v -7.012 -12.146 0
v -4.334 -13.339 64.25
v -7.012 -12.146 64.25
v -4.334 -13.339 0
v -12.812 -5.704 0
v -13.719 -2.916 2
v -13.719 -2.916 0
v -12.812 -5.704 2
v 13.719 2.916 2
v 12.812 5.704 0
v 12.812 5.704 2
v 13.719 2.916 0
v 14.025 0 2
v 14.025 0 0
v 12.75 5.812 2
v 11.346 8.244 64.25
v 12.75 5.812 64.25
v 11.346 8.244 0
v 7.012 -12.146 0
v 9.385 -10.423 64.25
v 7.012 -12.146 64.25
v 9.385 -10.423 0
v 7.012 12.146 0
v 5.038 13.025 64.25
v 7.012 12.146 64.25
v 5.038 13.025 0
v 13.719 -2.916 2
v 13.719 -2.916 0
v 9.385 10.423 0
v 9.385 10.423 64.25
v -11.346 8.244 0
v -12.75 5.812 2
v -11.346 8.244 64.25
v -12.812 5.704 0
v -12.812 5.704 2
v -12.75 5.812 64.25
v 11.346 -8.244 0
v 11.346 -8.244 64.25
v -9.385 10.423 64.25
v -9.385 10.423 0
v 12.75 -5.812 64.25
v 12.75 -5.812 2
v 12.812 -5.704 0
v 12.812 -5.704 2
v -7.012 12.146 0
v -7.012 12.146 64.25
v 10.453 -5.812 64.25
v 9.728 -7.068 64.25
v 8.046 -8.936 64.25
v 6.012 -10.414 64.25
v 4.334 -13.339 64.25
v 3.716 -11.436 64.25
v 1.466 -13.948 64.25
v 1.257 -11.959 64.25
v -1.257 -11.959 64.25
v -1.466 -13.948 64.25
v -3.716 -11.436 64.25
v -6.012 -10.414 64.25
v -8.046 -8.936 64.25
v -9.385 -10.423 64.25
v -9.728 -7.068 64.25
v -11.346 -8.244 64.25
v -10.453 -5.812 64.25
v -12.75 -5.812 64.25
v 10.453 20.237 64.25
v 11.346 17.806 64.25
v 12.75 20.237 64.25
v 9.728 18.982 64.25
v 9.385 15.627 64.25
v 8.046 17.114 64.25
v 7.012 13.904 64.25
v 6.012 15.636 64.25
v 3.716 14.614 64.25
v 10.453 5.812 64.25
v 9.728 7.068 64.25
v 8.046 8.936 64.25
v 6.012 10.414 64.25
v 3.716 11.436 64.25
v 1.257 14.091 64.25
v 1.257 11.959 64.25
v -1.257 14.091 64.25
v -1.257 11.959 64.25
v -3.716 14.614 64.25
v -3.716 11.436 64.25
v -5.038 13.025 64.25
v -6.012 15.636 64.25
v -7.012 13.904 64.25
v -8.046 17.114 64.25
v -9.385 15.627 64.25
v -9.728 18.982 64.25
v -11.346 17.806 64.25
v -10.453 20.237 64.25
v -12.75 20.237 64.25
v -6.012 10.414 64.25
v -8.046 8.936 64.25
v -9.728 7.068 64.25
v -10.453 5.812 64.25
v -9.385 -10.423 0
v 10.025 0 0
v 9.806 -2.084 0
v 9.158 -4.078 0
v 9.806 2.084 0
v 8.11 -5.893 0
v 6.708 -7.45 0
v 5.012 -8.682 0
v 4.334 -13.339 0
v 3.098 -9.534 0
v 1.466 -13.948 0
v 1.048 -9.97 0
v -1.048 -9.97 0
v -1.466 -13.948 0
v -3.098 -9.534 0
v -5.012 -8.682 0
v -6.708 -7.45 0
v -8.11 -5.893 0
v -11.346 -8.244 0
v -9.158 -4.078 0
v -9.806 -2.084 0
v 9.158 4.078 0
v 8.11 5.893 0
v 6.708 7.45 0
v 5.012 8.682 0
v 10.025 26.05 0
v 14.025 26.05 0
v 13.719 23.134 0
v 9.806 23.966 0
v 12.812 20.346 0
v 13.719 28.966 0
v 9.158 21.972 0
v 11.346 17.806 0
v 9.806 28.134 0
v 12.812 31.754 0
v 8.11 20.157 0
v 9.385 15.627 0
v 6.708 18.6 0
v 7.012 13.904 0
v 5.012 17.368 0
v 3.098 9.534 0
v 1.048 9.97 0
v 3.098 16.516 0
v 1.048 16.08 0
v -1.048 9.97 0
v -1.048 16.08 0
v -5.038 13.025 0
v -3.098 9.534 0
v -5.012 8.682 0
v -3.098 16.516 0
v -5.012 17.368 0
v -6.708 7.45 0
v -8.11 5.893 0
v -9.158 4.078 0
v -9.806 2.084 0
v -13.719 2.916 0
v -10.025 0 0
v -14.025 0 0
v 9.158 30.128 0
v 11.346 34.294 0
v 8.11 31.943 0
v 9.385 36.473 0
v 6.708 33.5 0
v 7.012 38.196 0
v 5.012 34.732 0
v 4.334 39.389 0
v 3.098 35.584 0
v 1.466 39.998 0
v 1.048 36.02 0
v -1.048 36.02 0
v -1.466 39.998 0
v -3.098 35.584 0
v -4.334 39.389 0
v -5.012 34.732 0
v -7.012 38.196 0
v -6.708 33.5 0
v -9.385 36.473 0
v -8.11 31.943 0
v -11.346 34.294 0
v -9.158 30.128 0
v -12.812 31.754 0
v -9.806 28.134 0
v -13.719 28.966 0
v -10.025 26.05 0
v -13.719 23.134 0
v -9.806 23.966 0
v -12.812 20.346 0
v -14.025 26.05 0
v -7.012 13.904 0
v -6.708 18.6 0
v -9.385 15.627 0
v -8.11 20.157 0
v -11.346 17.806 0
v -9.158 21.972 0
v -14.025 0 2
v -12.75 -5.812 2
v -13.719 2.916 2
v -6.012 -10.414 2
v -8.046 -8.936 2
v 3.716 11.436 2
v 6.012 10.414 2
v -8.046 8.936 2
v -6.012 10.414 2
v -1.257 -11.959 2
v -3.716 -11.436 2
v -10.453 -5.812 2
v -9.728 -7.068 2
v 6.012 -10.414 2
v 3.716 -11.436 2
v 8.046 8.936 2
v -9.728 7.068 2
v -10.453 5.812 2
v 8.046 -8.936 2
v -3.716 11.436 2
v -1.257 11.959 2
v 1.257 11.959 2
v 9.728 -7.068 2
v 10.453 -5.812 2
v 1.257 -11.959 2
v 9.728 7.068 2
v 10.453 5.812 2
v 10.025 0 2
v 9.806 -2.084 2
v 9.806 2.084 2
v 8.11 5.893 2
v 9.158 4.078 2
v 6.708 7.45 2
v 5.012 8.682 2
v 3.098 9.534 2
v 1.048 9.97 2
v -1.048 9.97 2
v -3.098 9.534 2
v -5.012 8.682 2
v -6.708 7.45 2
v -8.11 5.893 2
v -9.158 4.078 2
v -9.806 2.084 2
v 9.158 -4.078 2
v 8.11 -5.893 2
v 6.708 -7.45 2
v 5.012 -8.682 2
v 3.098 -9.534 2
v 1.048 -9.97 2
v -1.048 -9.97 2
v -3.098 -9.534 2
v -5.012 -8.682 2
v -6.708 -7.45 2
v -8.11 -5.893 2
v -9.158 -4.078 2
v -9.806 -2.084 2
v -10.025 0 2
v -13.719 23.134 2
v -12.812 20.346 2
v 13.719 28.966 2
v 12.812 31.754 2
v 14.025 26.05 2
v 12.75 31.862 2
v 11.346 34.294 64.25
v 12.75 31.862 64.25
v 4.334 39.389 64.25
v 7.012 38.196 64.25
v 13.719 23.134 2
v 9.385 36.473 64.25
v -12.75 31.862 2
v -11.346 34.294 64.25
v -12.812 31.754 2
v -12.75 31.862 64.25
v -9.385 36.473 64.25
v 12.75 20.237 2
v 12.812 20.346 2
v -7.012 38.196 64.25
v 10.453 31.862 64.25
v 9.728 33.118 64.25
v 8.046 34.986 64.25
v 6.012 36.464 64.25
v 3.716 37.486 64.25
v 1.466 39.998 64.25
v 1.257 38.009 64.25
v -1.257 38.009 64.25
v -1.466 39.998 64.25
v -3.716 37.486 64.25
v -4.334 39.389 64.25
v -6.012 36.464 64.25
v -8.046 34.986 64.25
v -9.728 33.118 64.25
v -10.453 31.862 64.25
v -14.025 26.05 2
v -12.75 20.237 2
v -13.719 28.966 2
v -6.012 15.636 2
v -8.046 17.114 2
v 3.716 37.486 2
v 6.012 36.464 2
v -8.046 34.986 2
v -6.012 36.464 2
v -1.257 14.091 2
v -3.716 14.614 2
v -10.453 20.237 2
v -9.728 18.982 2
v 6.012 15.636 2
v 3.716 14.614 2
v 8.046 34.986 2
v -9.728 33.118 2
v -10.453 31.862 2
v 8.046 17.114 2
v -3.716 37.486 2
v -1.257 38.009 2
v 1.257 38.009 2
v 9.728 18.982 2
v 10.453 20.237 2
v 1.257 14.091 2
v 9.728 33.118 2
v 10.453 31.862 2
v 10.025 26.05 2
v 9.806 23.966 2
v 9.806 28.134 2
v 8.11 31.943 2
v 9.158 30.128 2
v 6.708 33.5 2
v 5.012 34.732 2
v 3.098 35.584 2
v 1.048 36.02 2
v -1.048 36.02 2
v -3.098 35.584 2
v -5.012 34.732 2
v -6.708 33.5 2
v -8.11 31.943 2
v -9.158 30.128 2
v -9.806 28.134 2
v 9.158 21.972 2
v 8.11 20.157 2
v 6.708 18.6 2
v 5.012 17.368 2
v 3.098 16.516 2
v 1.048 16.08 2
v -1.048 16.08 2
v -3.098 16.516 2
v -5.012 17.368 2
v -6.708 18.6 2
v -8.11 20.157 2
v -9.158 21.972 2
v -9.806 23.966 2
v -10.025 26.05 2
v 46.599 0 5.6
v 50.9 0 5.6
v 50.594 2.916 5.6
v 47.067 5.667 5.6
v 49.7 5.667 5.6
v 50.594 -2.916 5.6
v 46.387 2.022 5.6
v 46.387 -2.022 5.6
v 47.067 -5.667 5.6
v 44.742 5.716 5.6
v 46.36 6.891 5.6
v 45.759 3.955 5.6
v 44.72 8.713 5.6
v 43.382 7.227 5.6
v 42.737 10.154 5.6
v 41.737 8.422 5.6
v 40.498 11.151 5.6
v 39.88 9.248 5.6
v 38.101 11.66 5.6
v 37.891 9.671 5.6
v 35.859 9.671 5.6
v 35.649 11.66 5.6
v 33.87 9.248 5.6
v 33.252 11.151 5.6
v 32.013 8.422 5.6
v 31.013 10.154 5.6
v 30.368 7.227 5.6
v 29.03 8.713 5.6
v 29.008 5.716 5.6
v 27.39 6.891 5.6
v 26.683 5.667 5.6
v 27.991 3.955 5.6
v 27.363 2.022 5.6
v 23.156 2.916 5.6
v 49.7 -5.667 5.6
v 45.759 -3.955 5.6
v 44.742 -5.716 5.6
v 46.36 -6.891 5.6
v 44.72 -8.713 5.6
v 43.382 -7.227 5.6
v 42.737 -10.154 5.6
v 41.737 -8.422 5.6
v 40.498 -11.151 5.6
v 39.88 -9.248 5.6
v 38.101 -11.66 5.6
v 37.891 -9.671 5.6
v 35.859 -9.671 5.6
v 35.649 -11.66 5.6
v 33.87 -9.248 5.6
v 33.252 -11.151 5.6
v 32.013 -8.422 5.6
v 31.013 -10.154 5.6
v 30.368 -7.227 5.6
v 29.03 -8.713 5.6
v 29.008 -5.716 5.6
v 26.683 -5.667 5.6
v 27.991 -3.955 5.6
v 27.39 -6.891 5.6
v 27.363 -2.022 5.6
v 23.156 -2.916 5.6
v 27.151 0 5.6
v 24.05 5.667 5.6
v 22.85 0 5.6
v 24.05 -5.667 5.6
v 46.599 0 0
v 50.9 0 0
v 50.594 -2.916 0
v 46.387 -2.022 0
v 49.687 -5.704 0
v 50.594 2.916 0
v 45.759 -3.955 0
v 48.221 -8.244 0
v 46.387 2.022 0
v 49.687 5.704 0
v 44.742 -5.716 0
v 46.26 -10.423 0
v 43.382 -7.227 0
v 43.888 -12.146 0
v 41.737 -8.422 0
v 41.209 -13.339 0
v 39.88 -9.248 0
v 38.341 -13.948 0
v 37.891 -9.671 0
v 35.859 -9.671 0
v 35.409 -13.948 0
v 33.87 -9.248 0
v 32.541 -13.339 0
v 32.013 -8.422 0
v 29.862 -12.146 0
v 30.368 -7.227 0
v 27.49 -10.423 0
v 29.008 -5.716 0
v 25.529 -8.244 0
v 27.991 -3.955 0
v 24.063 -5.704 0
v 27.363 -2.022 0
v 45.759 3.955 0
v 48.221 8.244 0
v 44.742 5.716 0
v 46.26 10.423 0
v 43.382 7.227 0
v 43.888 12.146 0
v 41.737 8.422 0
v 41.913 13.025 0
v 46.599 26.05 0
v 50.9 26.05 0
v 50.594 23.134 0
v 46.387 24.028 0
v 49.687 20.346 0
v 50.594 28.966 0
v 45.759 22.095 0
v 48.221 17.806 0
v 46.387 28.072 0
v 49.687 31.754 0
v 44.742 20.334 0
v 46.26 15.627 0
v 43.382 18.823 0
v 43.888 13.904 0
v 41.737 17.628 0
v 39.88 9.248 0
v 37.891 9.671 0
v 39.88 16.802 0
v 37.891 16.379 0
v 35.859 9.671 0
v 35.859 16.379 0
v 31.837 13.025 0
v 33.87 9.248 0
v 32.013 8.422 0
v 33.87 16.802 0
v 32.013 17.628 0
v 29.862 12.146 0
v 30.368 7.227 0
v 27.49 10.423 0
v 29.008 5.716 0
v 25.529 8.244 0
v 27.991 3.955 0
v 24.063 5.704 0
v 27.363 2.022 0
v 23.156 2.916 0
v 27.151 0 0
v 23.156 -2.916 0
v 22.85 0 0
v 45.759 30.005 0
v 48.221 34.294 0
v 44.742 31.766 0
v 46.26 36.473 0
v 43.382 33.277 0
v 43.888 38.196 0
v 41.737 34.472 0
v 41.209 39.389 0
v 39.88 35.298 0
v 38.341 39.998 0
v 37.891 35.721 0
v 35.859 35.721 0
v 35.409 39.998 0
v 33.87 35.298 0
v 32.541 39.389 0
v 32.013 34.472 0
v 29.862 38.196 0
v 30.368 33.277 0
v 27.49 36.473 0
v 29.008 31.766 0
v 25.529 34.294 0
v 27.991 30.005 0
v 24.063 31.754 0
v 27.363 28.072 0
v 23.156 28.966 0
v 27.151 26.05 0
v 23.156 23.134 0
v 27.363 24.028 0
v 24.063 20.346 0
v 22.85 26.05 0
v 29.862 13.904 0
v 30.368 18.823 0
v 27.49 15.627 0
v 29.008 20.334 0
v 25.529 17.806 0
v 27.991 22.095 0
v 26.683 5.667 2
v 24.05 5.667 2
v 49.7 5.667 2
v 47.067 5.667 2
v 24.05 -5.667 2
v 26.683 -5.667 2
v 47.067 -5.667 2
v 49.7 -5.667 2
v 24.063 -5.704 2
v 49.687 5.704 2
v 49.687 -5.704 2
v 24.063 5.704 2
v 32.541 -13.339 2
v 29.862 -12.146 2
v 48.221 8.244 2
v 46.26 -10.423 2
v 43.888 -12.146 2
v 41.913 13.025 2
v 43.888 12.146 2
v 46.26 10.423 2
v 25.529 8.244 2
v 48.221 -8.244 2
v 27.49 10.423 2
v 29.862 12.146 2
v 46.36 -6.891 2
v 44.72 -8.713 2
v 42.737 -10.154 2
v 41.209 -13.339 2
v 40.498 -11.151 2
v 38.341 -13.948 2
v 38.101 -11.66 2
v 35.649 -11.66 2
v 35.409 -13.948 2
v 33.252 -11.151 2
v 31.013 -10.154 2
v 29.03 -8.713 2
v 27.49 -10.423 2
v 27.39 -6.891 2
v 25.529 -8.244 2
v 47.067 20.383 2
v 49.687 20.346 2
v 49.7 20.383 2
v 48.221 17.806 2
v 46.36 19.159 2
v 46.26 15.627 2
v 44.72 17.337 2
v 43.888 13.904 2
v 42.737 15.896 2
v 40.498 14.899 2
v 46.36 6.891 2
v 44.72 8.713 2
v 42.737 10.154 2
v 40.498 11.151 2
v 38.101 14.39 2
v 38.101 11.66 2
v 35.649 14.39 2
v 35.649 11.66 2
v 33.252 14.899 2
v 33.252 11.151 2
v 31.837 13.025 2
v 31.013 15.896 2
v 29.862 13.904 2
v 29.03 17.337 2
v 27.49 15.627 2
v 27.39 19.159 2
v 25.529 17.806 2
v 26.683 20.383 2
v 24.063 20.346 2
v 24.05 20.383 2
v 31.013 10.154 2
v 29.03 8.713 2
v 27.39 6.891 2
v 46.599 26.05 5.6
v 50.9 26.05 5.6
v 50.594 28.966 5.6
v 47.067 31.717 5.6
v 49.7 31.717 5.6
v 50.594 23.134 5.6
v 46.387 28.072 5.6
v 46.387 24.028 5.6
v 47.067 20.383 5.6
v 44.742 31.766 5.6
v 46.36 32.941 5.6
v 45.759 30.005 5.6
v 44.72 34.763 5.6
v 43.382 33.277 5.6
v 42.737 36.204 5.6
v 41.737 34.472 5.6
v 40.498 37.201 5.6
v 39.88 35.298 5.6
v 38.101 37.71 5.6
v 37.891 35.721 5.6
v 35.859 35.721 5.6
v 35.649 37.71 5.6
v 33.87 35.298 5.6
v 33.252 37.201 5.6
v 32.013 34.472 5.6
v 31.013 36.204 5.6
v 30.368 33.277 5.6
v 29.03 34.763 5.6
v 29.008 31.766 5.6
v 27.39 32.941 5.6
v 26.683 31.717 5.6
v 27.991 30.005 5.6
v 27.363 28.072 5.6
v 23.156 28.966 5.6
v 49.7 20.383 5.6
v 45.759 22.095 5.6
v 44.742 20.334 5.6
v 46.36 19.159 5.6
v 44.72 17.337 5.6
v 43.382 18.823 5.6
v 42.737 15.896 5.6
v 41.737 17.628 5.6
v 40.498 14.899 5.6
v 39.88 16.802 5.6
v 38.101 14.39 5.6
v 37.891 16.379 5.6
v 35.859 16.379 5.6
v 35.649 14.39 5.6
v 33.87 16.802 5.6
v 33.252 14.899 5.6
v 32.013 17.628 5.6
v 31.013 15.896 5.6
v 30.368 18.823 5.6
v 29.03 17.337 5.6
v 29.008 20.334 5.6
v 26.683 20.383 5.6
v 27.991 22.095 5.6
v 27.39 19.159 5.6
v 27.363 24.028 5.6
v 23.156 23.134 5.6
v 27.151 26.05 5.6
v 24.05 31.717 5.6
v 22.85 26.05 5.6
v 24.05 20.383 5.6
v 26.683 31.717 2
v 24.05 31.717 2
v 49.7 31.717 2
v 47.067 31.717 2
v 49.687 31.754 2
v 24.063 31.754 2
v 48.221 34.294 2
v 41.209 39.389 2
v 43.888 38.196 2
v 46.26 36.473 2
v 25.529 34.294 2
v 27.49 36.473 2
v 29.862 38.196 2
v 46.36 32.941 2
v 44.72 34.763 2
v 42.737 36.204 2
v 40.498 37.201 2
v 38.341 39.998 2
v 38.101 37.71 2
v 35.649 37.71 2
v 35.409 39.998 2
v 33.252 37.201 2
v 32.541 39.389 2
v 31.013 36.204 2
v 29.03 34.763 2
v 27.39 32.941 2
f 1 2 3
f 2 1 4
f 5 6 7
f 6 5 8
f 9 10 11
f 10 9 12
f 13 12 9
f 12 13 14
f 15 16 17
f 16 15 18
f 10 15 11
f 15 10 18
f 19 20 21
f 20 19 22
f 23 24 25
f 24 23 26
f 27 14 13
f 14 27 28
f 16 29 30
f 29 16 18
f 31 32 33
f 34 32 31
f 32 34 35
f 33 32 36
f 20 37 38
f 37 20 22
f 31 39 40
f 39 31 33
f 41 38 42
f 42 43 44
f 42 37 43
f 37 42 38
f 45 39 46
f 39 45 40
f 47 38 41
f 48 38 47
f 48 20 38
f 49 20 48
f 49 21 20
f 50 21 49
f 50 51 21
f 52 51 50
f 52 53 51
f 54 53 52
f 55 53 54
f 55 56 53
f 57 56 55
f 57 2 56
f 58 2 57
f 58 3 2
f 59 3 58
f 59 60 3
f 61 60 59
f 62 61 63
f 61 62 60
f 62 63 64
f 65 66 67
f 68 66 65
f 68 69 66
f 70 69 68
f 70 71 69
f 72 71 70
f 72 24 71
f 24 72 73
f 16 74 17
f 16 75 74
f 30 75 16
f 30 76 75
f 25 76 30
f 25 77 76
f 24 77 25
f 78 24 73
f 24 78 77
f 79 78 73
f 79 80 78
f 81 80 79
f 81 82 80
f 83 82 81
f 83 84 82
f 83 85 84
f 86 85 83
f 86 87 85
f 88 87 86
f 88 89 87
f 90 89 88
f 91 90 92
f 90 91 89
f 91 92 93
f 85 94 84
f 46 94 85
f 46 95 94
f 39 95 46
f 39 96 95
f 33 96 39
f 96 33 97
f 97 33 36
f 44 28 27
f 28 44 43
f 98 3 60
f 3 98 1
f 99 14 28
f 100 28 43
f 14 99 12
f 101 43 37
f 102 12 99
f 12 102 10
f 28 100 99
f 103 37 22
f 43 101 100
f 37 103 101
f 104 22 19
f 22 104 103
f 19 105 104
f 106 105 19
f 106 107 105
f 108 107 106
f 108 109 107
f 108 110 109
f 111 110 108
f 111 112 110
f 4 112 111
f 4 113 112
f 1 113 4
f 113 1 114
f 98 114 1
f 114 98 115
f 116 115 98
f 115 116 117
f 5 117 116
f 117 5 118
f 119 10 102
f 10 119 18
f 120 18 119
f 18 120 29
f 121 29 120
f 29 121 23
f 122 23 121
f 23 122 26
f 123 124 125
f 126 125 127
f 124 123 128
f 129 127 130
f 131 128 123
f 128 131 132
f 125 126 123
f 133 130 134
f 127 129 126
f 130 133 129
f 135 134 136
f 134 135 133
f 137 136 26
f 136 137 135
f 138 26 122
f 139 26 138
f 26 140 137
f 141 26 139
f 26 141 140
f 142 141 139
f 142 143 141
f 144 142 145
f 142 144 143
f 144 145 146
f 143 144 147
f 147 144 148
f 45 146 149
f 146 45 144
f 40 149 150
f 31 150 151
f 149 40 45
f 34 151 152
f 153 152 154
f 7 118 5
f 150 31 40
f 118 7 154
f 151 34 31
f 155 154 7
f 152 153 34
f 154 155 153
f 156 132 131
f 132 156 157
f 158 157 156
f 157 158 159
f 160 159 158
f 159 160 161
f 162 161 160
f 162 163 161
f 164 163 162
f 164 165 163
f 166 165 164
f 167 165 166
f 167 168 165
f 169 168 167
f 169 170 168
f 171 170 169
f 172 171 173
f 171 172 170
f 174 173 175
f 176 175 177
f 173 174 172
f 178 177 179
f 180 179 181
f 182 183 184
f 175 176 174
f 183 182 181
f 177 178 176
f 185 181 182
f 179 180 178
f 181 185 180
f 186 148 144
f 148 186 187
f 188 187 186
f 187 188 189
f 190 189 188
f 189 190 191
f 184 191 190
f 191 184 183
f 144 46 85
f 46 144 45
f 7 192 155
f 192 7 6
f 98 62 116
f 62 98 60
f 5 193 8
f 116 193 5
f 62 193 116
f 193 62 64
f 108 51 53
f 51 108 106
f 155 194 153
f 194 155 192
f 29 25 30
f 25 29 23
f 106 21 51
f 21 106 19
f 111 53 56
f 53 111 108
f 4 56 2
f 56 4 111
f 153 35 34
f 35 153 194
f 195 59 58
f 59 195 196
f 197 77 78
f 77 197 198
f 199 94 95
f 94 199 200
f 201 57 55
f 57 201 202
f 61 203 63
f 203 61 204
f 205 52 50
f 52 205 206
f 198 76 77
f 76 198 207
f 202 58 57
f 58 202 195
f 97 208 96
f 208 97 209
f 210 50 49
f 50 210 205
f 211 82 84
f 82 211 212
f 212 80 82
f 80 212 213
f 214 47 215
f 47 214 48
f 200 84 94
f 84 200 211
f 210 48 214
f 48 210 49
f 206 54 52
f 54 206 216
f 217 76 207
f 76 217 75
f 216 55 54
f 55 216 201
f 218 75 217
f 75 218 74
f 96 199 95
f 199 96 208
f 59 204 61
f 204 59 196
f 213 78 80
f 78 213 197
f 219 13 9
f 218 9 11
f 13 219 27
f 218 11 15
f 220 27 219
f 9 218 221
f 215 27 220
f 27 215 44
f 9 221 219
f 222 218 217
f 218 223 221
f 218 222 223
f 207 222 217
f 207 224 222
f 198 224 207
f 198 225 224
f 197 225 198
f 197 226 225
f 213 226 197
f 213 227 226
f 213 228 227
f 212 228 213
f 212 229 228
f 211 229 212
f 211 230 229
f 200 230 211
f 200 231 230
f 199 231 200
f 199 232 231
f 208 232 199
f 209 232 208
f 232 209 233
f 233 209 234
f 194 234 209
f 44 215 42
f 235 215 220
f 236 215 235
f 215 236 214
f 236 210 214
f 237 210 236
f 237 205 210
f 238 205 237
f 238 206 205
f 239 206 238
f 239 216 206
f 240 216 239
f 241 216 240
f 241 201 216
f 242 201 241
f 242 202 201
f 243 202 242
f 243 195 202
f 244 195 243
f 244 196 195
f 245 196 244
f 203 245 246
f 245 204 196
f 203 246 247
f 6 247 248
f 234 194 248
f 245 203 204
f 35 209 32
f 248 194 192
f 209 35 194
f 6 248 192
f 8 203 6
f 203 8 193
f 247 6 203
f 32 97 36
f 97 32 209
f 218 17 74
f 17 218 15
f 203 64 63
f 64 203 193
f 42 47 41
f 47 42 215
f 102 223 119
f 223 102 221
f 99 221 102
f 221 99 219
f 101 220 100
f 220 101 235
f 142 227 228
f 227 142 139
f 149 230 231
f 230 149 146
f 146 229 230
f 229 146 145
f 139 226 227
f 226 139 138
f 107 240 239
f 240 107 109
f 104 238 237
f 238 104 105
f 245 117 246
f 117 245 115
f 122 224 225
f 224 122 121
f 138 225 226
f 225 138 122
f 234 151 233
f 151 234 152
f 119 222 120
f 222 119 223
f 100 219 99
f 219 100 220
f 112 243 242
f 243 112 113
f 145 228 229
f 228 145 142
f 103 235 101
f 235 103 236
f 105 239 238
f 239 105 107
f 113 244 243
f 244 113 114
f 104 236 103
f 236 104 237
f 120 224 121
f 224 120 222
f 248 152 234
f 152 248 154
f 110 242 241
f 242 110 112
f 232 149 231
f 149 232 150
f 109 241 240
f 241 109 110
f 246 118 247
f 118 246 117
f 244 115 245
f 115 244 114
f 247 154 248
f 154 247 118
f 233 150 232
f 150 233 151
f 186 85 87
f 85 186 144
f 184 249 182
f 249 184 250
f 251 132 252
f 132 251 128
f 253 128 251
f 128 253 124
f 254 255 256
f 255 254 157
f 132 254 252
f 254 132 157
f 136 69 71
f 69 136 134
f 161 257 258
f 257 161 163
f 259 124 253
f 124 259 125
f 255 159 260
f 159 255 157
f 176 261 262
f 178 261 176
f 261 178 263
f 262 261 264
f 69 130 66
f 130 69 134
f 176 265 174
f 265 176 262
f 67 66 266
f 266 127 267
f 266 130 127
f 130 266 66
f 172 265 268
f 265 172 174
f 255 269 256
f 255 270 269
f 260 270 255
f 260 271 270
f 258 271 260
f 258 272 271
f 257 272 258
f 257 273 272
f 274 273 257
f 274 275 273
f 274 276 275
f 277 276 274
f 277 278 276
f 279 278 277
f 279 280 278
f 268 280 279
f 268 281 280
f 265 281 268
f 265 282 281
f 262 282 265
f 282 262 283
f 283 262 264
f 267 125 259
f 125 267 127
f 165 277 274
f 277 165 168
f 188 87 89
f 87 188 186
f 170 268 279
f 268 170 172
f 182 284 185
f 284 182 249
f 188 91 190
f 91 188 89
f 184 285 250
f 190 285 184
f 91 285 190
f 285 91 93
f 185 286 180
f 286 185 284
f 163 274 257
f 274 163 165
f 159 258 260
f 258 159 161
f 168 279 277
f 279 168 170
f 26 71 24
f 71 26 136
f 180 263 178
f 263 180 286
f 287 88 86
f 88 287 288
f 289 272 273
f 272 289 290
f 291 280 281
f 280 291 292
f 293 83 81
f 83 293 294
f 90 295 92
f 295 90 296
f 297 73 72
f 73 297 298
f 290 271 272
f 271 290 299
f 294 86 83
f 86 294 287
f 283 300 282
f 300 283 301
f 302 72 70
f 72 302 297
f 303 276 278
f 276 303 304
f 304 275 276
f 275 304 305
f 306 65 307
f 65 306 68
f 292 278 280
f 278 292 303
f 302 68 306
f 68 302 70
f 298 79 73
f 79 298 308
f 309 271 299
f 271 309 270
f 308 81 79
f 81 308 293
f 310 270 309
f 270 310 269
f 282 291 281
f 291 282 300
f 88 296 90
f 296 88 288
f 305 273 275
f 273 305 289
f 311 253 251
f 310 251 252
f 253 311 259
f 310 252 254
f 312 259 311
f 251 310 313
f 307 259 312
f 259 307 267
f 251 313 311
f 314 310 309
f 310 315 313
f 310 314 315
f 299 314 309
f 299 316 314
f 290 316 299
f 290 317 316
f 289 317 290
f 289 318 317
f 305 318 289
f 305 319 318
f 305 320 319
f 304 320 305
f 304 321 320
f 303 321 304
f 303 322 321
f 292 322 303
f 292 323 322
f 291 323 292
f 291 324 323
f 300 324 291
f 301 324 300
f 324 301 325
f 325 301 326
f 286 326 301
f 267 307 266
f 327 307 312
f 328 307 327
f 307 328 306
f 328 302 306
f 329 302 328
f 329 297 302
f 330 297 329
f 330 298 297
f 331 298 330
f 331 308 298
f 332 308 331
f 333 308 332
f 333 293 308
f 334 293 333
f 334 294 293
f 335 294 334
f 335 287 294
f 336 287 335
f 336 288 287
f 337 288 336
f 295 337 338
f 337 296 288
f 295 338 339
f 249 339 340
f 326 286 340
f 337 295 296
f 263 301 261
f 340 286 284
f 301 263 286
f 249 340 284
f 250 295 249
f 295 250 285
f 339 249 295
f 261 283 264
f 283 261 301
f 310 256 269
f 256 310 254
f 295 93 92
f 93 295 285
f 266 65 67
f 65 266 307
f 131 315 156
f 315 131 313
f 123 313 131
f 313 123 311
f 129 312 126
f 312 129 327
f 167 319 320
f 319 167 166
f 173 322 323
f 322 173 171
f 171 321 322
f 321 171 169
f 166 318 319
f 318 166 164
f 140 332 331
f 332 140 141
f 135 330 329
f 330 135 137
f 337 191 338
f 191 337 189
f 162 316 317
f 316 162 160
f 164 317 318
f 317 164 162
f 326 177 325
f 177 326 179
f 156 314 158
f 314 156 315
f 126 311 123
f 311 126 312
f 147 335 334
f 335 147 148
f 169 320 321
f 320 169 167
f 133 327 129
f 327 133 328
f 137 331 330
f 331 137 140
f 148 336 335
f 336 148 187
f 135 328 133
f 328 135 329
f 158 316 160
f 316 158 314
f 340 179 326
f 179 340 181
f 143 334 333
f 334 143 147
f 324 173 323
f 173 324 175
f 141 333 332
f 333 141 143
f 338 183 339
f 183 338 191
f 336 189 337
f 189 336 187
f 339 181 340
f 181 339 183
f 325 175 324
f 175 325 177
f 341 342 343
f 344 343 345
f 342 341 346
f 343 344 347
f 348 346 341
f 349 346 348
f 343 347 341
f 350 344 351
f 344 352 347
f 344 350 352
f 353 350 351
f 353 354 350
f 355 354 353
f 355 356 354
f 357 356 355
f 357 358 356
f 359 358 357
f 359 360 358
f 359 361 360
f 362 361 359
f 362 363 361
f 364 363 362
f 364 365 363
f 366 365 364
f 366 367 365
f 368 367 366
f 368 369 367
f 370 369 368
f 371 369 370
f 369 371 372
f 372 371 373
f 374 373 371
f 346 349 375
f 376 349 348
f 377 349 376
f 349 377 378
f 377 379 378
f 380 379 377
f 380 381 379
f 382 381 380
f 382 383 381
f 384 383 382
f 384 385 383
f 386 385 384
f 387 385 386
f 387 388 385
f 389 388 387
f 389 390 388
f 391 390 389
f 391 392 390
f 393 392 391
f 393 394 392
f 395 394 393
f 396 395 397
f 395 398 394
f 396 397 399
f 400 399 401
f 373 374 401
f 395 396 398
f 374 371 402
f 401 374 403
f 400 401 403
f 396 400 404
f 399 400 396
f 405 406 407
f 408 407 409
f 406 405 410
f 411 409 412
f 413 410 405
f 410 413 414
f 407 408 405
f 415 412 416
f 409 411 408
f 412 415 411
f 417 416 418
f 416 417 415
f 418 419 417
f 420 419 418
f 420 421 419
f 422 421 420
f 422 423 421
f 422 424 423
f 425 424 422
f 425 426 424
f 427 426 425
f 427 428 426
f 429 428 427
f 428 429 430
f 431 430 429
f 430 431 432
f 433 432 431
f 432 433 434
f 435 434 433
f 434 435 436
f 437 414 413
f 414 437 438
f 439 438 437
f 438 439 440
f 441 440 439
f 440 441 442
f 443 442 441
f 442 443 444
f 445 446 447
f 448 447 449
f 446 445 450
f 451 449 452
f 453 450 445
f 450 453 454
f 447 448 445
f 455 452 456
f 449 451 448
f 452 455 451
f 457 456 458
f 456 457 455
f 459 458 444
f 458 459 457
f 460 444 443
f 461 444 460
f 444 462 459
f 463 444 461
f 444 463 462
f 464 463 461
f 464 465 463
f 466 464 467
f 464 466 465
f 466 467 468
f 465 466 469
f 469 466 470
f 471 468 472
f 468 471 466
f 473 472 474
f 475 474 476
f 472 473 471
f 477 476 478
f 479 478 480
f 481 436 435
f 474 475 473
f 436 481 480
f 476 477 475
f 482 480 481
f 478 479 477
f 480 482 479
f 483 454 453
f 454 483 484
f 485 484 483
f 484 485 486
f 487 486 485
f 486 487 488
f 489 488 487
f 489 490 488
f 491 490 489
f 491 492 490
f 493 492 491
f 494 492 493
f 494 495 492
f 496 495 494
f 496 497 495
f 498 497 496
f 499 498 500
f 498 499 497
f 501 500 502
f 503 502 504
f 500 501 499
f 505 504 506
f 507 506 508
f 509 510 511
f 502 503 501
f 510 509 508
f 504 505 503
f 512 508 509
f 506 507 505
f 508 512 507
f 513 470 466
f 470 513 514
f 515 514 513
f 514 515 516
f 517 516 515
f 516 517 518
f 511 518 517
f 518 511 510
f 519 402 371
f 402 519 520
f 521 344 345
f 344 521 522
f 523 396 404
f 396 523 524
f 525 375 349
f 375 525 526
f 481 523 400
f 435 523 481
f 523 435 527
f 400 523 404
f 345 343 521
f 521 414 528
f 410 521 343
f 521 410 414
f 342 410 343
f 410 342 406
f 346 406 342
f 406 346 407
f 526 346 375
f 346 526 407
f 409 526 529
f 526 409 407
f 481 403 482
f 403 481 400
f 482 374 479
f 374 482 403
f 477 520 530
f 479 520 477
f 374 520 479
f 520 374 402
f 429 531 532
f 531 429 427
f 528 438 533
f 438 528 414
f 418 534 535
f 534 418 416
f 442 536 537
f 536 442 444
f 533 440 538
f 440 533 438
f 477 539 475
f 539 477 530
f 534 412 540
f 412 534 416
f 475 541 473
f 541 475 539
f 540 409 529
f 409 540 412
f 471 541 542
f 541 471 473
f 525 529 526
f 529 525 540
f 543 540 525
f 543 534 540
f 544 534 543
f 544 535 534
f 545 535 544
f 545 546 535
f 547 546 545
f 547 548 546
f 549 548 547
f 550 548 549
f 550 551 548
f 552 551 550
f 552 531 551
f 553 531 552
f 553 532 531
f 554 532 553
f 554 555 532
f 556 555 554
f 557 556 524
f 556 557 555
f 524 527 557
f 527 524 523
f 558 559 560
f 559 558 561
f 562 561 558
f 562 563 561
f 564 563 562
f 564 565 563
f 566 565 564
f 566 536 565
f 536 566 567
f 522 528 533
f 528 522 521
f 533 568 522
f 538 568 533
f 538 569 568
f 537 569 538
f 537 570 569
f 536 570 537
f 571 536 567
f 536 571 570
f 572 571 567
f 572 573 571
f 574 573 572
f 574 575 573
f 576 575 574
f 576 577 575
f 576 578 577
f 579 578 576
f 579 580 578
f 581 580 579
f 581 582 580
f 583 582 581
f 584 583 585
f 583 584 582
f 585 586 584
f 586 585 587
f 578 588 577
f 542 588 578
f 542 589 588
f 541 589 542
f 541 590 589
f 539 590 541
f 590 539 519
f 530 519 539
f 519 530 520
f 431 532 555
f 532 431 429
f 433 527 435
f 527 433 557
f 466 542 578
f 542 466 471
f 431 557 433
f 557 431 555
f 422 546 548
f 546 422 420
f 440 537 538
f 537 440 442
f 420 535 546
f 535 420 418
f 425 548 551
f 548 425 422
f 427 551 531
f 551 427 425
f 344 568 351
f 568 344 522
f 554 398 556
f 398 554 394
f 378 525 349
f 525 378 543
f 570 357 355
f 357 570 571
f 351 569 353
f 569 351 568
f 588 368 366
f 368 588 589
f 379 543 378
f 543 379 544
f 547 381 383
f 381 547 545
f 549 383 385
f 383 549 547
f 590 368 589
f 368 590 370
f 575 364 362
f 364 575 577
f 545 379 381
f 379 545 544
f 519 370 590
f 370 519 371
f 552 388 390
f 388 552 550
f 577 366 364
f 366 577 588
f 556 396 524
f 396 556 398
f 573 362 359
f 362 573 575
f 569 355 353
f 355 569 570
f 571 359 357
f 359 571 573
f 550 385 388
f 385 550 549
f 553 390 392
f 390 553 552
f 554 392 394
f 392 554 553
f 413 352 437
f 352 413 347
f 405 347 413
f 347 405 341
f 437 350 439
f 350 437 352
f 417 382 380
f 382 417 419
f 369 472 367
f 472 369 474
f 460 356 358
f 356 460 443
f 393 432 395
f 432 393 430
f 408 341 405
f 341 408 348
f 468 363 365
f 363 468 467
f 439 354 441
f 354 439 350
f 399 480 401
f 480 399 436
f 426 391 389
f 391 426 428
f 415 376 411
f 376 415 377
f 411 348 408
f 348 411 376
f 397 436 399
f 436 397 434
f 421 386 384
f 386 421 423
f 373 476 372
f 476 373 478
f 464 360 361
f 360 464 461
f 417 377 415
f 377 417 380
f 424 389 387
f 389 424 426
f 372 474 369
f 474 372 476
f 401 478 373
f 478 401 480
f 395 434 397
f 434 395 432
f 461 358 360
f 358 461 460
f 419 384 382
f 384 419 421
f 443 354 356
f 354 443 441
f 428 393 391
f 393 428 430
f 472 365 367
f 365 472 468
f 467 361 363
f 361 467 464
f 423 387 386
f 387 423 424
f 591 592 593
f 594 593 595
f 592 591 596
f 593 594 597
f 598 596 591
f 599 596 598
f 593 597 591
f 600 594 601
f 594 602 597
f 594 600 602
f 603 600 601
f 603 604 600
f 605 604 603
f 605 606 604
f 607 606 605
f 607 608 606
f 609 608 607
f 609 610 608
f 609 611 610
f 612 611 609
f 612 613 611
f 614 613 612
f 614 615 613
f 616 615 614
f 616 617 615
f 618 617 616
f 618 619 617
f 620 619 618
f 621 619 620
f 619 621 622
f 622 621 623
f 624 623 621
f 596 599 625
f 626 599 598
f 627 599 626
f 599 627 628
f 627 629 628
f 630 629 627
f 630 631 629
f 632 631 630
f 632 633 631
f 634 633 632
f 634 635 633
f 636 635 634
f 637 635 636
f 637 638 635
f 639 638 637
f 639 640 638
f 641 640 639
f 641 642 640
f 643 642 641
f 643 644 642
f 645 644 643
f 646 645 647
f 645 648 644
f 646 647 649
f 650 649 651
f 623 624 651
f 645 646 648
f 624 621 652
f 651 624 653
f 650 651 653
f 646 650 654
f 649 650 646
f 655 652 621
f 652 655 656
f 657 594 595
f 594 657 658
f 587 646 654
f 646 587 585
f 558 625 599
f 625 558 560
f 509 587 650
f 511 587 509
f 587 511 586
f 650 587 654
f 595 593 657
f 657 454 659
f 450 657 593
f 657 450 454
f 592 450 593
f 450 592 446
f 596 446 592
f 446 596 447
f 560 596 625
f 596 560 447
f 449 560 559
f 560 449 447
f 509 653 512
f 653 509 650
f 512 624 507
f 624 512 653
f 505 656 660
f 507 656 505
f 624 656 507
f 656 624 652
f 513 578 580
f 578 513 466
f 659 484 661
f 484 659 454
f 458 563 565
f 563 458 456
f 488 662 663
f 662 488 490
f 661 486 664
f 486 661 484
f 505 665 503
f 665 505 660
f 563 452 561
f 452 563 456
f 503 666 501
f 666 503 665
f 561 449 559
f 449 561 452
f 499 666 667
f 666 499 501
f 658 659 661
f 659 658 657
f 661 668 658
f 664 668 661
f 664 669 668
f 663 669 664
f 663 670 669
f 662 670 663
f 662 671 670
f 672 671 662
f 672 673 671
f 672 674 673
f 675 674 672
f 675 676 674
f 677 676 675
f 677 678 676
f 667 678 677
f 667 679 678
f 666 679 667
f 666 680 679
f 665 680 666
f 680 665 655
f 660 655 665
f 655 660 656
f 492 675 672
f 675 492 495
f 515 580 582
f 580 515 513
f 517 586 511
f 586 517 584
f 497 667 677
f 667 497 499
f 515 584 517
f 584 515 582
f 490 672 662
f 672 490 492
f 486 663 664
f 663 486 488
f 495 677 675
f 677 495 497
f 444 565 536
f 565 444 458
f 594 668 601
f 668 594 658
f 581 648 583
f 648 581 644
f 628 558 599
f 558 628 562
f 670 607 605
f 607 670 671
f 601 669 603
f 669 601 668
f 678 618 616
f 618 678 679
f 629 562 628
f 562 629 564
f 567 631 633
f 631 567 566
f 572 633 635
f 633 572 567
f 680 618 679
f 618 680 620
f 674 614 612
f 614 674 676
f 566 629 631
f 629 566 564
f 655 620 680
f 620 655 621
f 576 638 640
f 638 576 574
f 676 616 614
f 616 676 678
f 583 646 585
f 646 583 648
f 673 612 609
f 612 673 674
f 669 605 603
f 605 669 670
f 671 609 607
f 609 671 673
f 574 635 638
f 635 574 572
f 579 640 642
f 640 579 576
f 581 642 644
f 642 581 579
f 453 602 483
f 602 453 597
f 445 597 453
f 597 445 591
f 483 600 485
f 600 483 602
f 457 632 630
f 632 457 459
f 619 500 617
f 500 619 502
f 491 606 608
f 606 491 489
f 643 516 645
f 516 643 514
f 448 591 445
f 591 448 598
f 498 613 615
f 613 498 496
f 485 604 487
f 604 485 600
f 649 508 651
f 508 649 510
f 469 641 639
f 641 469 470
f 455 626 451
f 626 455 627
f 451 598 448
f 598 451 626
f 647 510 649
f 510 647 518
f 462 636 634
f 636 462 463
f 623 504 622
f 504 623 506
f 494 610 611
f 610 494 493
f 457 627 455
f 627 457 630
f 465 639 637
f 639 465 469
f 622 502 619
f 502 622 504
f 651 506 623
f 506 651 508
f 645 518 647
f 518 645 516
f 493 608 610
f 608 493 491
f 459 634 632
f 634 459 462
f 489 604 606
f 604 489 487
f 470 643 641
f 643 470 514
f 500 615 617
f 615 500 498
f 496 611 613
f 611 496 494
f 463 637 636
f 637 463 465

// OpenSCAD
/*
 * PARAMETRIC COIN TUBES + CAP
 * VERSION 1.3.1
 * last update: 02/12/13
 * design by newq 
 * mod kitwallace (thanks!)
 */

// 
// the generated tubes insides are 2 coins higher than the number of coins they fit

coin_type = 0; // [ 0:1 Euro, 1:2 Euro, 2:50 Euro cents,  3:20 Euro cents, 4:10 Euro cents, 5:5 Euro cents, 6:2 Euro cent, 7: 1 Euro cent, 8: 1 US Dollar, 9: 0.50 US Dollar, 10: 0.25 US Dollar, 11: 0.10 US Dollar, 12: 0.05 US Dollar, 13: 0.01 US Dollar, 14: 2 Canadian Dollar, 15: 1 Canadian Dollar, 16: 0.50 Canadian Dollar, 17: 0.25 Canadian Dollar, 18: 0.10 Canadian Dollar, 19: 0.05 Canadian Dollar, 20: 0.01 Canadian Dollar]

// how many stacked coins should fit in a tube
number_of_coins = 25; 
number_of_tubes = 2; 

// Do you want to print the tubes?
generate_tube = 1; // [1:Yes, 0:No] 
// Do you want a cap to close the tube?
generate_cap = 1; // [1:Yes, 0:No] 
// thickness of wall and bottom (mm)
tube_wall = 2;  
// clearance from coin to wall of tube (mm) 
clearance = 0.4;
// if the cap fits too tight you might decrease slightly
fudge_factor = 0.975; 

// NOTHING TO SEE HERE :)

// coin data - name, diameter, height
coins = [ 
              ["1 Euro", 23.25, 2.33], 
              ["2 Euro", 25.75, 2.20],
              ["50 Euro cents", 24.25, 2.38],
              ["20 Euro cents", 22.25, 2.14],
              ["10 Euro cents", 19.75, 1.93],
              ["5 Euro cents", 21.25, 1.67],
              ["2 Euro cents", 18.75, 1.67],
              ["1 Euro cents", 16.25, 1.67],
              ["1 US Dollar", 26.50, 2.00],
              ["0.50 US Dollar", 30.61, 2.15],
              ["0.25 US Dollar", 24.26, 1.75],
              ["0.10 US Dollar", 17.91, 1.35],
              ["0.05 US Dollar", 21.21, 1.95],
              ["0.01 US Dollar", 19.05, 1.55],
              ["2 Canadian Dollar", 28.00, 1.80],
              ["1 Canadian Dollar", 26.50, 1.75],
              ["0.50 Canadian Dollar", 27.13, 1.95],
              ["0.25 Canadian Dollar", 23.88, 1.58],
              ["0.10 Canadian Dollar", 18.03, 1.22],
              ["0.05 Canadian Dollar", 21.2, 1.76],
              ["0.01 Canadian Dollar", 19.05, 1.45]
            ];

coin_diameter = coins[coin_type][1];
coin_height = coins[coin_type][2];

// generating the tubes
if (generate_tube) {
  assign(cyl_inner_h = (coin_height * number_of_coins) + (4 * tube_wall),
             cyl_inner_r = (coin_diameter / 2) + clearance,

             cyl_outer_h = (coin_height * number_of_coins) + (3 * tube_wall),
             cyl_outer_r = (coin_diameter / 2) + tube_wall + clearance,

             cutout_x = coin_diameter + (4 * tube_wall),
             cutout_y = (coin_diameter / 2),
             cutout_z = (coin_height * number_of_coins) + (3 * tube_wall)
             )


  for (z = [0 : (number_of_tubes-1)]){

	translate (v = [0, z * (cyl_outer_r * 2 - tube_wall), 0]){
		difference(){	
			difference(){
				difference() {
					// outer tube
					cylinder(h = cyl_outer_h, r = cyl_outer_r);
					// inner tube
					translate(v = [0, 0, tube_wall]) {
						cylinder(h = cyl_inner_h, r = cyl_inner_r);
					}
				}
				// round bottom cutout
				translate (v = [0, 0, ((cutout_z / 2) + tube_wall)]){
					cube(size = [cutout_x, cutout_y, cutout_z], center = true);
				}
			}
			// cutout
			translate (v = [0, 0, -tube_wall]){
				cylinder(h = (cyl_inner_h + tube_wall), r = (cyl_inner_r - tube_wall));
			}
		}
   }
}

}

// generating the tube tops

if (generate_cap) {
   assign (cyl_inner_h = 3*tube_wall - clearance,
               cyl_inner_r = ((coin_diameter / 2) + clearance) * fudge_factor,

               cyl_outer_h = tube_wall,
               cyl_outer_r = (coin_diameter / 2) + tube_wall + clearance,

               cutout_x = coin_diameter + (4 * tube_wall),
               cutout_y = (coin_diameter / 2) * fudge_factor,
               cutout_z = 3*tube_wall - clearance
             )
    translate([1.5 * coin_diameter + tube_wall, 0, 0]){
	for (z = [0 : (number_of_tubes-1)]){
		
		translate (v = [0, z * (cyl_outer_r * 2 - tube_wall), 0]){
			difference(){
				union(){		
					cylinder(h = cyl_outer_h, r = cyl_outer_r);
					cylinder(h = cyl_inner_h, r = cyl_inner_r);
				
					intersection(){
						translate([0,0,cutout_z/2]){
							cube(size = [cutout_x, cutout_y, cutout_z], center = true);
						}
						cylinder(h = cyl_outer_h+10, r = cyl_outer_r);
					}
				}
				
				translate([0,0,-(cyl_inner_h /2)]){
					cylinder(h = cyl_inner_h *2, r = cyl_inner_r - tube_wall);
				}			
			}		
		}
	}	
}
}
